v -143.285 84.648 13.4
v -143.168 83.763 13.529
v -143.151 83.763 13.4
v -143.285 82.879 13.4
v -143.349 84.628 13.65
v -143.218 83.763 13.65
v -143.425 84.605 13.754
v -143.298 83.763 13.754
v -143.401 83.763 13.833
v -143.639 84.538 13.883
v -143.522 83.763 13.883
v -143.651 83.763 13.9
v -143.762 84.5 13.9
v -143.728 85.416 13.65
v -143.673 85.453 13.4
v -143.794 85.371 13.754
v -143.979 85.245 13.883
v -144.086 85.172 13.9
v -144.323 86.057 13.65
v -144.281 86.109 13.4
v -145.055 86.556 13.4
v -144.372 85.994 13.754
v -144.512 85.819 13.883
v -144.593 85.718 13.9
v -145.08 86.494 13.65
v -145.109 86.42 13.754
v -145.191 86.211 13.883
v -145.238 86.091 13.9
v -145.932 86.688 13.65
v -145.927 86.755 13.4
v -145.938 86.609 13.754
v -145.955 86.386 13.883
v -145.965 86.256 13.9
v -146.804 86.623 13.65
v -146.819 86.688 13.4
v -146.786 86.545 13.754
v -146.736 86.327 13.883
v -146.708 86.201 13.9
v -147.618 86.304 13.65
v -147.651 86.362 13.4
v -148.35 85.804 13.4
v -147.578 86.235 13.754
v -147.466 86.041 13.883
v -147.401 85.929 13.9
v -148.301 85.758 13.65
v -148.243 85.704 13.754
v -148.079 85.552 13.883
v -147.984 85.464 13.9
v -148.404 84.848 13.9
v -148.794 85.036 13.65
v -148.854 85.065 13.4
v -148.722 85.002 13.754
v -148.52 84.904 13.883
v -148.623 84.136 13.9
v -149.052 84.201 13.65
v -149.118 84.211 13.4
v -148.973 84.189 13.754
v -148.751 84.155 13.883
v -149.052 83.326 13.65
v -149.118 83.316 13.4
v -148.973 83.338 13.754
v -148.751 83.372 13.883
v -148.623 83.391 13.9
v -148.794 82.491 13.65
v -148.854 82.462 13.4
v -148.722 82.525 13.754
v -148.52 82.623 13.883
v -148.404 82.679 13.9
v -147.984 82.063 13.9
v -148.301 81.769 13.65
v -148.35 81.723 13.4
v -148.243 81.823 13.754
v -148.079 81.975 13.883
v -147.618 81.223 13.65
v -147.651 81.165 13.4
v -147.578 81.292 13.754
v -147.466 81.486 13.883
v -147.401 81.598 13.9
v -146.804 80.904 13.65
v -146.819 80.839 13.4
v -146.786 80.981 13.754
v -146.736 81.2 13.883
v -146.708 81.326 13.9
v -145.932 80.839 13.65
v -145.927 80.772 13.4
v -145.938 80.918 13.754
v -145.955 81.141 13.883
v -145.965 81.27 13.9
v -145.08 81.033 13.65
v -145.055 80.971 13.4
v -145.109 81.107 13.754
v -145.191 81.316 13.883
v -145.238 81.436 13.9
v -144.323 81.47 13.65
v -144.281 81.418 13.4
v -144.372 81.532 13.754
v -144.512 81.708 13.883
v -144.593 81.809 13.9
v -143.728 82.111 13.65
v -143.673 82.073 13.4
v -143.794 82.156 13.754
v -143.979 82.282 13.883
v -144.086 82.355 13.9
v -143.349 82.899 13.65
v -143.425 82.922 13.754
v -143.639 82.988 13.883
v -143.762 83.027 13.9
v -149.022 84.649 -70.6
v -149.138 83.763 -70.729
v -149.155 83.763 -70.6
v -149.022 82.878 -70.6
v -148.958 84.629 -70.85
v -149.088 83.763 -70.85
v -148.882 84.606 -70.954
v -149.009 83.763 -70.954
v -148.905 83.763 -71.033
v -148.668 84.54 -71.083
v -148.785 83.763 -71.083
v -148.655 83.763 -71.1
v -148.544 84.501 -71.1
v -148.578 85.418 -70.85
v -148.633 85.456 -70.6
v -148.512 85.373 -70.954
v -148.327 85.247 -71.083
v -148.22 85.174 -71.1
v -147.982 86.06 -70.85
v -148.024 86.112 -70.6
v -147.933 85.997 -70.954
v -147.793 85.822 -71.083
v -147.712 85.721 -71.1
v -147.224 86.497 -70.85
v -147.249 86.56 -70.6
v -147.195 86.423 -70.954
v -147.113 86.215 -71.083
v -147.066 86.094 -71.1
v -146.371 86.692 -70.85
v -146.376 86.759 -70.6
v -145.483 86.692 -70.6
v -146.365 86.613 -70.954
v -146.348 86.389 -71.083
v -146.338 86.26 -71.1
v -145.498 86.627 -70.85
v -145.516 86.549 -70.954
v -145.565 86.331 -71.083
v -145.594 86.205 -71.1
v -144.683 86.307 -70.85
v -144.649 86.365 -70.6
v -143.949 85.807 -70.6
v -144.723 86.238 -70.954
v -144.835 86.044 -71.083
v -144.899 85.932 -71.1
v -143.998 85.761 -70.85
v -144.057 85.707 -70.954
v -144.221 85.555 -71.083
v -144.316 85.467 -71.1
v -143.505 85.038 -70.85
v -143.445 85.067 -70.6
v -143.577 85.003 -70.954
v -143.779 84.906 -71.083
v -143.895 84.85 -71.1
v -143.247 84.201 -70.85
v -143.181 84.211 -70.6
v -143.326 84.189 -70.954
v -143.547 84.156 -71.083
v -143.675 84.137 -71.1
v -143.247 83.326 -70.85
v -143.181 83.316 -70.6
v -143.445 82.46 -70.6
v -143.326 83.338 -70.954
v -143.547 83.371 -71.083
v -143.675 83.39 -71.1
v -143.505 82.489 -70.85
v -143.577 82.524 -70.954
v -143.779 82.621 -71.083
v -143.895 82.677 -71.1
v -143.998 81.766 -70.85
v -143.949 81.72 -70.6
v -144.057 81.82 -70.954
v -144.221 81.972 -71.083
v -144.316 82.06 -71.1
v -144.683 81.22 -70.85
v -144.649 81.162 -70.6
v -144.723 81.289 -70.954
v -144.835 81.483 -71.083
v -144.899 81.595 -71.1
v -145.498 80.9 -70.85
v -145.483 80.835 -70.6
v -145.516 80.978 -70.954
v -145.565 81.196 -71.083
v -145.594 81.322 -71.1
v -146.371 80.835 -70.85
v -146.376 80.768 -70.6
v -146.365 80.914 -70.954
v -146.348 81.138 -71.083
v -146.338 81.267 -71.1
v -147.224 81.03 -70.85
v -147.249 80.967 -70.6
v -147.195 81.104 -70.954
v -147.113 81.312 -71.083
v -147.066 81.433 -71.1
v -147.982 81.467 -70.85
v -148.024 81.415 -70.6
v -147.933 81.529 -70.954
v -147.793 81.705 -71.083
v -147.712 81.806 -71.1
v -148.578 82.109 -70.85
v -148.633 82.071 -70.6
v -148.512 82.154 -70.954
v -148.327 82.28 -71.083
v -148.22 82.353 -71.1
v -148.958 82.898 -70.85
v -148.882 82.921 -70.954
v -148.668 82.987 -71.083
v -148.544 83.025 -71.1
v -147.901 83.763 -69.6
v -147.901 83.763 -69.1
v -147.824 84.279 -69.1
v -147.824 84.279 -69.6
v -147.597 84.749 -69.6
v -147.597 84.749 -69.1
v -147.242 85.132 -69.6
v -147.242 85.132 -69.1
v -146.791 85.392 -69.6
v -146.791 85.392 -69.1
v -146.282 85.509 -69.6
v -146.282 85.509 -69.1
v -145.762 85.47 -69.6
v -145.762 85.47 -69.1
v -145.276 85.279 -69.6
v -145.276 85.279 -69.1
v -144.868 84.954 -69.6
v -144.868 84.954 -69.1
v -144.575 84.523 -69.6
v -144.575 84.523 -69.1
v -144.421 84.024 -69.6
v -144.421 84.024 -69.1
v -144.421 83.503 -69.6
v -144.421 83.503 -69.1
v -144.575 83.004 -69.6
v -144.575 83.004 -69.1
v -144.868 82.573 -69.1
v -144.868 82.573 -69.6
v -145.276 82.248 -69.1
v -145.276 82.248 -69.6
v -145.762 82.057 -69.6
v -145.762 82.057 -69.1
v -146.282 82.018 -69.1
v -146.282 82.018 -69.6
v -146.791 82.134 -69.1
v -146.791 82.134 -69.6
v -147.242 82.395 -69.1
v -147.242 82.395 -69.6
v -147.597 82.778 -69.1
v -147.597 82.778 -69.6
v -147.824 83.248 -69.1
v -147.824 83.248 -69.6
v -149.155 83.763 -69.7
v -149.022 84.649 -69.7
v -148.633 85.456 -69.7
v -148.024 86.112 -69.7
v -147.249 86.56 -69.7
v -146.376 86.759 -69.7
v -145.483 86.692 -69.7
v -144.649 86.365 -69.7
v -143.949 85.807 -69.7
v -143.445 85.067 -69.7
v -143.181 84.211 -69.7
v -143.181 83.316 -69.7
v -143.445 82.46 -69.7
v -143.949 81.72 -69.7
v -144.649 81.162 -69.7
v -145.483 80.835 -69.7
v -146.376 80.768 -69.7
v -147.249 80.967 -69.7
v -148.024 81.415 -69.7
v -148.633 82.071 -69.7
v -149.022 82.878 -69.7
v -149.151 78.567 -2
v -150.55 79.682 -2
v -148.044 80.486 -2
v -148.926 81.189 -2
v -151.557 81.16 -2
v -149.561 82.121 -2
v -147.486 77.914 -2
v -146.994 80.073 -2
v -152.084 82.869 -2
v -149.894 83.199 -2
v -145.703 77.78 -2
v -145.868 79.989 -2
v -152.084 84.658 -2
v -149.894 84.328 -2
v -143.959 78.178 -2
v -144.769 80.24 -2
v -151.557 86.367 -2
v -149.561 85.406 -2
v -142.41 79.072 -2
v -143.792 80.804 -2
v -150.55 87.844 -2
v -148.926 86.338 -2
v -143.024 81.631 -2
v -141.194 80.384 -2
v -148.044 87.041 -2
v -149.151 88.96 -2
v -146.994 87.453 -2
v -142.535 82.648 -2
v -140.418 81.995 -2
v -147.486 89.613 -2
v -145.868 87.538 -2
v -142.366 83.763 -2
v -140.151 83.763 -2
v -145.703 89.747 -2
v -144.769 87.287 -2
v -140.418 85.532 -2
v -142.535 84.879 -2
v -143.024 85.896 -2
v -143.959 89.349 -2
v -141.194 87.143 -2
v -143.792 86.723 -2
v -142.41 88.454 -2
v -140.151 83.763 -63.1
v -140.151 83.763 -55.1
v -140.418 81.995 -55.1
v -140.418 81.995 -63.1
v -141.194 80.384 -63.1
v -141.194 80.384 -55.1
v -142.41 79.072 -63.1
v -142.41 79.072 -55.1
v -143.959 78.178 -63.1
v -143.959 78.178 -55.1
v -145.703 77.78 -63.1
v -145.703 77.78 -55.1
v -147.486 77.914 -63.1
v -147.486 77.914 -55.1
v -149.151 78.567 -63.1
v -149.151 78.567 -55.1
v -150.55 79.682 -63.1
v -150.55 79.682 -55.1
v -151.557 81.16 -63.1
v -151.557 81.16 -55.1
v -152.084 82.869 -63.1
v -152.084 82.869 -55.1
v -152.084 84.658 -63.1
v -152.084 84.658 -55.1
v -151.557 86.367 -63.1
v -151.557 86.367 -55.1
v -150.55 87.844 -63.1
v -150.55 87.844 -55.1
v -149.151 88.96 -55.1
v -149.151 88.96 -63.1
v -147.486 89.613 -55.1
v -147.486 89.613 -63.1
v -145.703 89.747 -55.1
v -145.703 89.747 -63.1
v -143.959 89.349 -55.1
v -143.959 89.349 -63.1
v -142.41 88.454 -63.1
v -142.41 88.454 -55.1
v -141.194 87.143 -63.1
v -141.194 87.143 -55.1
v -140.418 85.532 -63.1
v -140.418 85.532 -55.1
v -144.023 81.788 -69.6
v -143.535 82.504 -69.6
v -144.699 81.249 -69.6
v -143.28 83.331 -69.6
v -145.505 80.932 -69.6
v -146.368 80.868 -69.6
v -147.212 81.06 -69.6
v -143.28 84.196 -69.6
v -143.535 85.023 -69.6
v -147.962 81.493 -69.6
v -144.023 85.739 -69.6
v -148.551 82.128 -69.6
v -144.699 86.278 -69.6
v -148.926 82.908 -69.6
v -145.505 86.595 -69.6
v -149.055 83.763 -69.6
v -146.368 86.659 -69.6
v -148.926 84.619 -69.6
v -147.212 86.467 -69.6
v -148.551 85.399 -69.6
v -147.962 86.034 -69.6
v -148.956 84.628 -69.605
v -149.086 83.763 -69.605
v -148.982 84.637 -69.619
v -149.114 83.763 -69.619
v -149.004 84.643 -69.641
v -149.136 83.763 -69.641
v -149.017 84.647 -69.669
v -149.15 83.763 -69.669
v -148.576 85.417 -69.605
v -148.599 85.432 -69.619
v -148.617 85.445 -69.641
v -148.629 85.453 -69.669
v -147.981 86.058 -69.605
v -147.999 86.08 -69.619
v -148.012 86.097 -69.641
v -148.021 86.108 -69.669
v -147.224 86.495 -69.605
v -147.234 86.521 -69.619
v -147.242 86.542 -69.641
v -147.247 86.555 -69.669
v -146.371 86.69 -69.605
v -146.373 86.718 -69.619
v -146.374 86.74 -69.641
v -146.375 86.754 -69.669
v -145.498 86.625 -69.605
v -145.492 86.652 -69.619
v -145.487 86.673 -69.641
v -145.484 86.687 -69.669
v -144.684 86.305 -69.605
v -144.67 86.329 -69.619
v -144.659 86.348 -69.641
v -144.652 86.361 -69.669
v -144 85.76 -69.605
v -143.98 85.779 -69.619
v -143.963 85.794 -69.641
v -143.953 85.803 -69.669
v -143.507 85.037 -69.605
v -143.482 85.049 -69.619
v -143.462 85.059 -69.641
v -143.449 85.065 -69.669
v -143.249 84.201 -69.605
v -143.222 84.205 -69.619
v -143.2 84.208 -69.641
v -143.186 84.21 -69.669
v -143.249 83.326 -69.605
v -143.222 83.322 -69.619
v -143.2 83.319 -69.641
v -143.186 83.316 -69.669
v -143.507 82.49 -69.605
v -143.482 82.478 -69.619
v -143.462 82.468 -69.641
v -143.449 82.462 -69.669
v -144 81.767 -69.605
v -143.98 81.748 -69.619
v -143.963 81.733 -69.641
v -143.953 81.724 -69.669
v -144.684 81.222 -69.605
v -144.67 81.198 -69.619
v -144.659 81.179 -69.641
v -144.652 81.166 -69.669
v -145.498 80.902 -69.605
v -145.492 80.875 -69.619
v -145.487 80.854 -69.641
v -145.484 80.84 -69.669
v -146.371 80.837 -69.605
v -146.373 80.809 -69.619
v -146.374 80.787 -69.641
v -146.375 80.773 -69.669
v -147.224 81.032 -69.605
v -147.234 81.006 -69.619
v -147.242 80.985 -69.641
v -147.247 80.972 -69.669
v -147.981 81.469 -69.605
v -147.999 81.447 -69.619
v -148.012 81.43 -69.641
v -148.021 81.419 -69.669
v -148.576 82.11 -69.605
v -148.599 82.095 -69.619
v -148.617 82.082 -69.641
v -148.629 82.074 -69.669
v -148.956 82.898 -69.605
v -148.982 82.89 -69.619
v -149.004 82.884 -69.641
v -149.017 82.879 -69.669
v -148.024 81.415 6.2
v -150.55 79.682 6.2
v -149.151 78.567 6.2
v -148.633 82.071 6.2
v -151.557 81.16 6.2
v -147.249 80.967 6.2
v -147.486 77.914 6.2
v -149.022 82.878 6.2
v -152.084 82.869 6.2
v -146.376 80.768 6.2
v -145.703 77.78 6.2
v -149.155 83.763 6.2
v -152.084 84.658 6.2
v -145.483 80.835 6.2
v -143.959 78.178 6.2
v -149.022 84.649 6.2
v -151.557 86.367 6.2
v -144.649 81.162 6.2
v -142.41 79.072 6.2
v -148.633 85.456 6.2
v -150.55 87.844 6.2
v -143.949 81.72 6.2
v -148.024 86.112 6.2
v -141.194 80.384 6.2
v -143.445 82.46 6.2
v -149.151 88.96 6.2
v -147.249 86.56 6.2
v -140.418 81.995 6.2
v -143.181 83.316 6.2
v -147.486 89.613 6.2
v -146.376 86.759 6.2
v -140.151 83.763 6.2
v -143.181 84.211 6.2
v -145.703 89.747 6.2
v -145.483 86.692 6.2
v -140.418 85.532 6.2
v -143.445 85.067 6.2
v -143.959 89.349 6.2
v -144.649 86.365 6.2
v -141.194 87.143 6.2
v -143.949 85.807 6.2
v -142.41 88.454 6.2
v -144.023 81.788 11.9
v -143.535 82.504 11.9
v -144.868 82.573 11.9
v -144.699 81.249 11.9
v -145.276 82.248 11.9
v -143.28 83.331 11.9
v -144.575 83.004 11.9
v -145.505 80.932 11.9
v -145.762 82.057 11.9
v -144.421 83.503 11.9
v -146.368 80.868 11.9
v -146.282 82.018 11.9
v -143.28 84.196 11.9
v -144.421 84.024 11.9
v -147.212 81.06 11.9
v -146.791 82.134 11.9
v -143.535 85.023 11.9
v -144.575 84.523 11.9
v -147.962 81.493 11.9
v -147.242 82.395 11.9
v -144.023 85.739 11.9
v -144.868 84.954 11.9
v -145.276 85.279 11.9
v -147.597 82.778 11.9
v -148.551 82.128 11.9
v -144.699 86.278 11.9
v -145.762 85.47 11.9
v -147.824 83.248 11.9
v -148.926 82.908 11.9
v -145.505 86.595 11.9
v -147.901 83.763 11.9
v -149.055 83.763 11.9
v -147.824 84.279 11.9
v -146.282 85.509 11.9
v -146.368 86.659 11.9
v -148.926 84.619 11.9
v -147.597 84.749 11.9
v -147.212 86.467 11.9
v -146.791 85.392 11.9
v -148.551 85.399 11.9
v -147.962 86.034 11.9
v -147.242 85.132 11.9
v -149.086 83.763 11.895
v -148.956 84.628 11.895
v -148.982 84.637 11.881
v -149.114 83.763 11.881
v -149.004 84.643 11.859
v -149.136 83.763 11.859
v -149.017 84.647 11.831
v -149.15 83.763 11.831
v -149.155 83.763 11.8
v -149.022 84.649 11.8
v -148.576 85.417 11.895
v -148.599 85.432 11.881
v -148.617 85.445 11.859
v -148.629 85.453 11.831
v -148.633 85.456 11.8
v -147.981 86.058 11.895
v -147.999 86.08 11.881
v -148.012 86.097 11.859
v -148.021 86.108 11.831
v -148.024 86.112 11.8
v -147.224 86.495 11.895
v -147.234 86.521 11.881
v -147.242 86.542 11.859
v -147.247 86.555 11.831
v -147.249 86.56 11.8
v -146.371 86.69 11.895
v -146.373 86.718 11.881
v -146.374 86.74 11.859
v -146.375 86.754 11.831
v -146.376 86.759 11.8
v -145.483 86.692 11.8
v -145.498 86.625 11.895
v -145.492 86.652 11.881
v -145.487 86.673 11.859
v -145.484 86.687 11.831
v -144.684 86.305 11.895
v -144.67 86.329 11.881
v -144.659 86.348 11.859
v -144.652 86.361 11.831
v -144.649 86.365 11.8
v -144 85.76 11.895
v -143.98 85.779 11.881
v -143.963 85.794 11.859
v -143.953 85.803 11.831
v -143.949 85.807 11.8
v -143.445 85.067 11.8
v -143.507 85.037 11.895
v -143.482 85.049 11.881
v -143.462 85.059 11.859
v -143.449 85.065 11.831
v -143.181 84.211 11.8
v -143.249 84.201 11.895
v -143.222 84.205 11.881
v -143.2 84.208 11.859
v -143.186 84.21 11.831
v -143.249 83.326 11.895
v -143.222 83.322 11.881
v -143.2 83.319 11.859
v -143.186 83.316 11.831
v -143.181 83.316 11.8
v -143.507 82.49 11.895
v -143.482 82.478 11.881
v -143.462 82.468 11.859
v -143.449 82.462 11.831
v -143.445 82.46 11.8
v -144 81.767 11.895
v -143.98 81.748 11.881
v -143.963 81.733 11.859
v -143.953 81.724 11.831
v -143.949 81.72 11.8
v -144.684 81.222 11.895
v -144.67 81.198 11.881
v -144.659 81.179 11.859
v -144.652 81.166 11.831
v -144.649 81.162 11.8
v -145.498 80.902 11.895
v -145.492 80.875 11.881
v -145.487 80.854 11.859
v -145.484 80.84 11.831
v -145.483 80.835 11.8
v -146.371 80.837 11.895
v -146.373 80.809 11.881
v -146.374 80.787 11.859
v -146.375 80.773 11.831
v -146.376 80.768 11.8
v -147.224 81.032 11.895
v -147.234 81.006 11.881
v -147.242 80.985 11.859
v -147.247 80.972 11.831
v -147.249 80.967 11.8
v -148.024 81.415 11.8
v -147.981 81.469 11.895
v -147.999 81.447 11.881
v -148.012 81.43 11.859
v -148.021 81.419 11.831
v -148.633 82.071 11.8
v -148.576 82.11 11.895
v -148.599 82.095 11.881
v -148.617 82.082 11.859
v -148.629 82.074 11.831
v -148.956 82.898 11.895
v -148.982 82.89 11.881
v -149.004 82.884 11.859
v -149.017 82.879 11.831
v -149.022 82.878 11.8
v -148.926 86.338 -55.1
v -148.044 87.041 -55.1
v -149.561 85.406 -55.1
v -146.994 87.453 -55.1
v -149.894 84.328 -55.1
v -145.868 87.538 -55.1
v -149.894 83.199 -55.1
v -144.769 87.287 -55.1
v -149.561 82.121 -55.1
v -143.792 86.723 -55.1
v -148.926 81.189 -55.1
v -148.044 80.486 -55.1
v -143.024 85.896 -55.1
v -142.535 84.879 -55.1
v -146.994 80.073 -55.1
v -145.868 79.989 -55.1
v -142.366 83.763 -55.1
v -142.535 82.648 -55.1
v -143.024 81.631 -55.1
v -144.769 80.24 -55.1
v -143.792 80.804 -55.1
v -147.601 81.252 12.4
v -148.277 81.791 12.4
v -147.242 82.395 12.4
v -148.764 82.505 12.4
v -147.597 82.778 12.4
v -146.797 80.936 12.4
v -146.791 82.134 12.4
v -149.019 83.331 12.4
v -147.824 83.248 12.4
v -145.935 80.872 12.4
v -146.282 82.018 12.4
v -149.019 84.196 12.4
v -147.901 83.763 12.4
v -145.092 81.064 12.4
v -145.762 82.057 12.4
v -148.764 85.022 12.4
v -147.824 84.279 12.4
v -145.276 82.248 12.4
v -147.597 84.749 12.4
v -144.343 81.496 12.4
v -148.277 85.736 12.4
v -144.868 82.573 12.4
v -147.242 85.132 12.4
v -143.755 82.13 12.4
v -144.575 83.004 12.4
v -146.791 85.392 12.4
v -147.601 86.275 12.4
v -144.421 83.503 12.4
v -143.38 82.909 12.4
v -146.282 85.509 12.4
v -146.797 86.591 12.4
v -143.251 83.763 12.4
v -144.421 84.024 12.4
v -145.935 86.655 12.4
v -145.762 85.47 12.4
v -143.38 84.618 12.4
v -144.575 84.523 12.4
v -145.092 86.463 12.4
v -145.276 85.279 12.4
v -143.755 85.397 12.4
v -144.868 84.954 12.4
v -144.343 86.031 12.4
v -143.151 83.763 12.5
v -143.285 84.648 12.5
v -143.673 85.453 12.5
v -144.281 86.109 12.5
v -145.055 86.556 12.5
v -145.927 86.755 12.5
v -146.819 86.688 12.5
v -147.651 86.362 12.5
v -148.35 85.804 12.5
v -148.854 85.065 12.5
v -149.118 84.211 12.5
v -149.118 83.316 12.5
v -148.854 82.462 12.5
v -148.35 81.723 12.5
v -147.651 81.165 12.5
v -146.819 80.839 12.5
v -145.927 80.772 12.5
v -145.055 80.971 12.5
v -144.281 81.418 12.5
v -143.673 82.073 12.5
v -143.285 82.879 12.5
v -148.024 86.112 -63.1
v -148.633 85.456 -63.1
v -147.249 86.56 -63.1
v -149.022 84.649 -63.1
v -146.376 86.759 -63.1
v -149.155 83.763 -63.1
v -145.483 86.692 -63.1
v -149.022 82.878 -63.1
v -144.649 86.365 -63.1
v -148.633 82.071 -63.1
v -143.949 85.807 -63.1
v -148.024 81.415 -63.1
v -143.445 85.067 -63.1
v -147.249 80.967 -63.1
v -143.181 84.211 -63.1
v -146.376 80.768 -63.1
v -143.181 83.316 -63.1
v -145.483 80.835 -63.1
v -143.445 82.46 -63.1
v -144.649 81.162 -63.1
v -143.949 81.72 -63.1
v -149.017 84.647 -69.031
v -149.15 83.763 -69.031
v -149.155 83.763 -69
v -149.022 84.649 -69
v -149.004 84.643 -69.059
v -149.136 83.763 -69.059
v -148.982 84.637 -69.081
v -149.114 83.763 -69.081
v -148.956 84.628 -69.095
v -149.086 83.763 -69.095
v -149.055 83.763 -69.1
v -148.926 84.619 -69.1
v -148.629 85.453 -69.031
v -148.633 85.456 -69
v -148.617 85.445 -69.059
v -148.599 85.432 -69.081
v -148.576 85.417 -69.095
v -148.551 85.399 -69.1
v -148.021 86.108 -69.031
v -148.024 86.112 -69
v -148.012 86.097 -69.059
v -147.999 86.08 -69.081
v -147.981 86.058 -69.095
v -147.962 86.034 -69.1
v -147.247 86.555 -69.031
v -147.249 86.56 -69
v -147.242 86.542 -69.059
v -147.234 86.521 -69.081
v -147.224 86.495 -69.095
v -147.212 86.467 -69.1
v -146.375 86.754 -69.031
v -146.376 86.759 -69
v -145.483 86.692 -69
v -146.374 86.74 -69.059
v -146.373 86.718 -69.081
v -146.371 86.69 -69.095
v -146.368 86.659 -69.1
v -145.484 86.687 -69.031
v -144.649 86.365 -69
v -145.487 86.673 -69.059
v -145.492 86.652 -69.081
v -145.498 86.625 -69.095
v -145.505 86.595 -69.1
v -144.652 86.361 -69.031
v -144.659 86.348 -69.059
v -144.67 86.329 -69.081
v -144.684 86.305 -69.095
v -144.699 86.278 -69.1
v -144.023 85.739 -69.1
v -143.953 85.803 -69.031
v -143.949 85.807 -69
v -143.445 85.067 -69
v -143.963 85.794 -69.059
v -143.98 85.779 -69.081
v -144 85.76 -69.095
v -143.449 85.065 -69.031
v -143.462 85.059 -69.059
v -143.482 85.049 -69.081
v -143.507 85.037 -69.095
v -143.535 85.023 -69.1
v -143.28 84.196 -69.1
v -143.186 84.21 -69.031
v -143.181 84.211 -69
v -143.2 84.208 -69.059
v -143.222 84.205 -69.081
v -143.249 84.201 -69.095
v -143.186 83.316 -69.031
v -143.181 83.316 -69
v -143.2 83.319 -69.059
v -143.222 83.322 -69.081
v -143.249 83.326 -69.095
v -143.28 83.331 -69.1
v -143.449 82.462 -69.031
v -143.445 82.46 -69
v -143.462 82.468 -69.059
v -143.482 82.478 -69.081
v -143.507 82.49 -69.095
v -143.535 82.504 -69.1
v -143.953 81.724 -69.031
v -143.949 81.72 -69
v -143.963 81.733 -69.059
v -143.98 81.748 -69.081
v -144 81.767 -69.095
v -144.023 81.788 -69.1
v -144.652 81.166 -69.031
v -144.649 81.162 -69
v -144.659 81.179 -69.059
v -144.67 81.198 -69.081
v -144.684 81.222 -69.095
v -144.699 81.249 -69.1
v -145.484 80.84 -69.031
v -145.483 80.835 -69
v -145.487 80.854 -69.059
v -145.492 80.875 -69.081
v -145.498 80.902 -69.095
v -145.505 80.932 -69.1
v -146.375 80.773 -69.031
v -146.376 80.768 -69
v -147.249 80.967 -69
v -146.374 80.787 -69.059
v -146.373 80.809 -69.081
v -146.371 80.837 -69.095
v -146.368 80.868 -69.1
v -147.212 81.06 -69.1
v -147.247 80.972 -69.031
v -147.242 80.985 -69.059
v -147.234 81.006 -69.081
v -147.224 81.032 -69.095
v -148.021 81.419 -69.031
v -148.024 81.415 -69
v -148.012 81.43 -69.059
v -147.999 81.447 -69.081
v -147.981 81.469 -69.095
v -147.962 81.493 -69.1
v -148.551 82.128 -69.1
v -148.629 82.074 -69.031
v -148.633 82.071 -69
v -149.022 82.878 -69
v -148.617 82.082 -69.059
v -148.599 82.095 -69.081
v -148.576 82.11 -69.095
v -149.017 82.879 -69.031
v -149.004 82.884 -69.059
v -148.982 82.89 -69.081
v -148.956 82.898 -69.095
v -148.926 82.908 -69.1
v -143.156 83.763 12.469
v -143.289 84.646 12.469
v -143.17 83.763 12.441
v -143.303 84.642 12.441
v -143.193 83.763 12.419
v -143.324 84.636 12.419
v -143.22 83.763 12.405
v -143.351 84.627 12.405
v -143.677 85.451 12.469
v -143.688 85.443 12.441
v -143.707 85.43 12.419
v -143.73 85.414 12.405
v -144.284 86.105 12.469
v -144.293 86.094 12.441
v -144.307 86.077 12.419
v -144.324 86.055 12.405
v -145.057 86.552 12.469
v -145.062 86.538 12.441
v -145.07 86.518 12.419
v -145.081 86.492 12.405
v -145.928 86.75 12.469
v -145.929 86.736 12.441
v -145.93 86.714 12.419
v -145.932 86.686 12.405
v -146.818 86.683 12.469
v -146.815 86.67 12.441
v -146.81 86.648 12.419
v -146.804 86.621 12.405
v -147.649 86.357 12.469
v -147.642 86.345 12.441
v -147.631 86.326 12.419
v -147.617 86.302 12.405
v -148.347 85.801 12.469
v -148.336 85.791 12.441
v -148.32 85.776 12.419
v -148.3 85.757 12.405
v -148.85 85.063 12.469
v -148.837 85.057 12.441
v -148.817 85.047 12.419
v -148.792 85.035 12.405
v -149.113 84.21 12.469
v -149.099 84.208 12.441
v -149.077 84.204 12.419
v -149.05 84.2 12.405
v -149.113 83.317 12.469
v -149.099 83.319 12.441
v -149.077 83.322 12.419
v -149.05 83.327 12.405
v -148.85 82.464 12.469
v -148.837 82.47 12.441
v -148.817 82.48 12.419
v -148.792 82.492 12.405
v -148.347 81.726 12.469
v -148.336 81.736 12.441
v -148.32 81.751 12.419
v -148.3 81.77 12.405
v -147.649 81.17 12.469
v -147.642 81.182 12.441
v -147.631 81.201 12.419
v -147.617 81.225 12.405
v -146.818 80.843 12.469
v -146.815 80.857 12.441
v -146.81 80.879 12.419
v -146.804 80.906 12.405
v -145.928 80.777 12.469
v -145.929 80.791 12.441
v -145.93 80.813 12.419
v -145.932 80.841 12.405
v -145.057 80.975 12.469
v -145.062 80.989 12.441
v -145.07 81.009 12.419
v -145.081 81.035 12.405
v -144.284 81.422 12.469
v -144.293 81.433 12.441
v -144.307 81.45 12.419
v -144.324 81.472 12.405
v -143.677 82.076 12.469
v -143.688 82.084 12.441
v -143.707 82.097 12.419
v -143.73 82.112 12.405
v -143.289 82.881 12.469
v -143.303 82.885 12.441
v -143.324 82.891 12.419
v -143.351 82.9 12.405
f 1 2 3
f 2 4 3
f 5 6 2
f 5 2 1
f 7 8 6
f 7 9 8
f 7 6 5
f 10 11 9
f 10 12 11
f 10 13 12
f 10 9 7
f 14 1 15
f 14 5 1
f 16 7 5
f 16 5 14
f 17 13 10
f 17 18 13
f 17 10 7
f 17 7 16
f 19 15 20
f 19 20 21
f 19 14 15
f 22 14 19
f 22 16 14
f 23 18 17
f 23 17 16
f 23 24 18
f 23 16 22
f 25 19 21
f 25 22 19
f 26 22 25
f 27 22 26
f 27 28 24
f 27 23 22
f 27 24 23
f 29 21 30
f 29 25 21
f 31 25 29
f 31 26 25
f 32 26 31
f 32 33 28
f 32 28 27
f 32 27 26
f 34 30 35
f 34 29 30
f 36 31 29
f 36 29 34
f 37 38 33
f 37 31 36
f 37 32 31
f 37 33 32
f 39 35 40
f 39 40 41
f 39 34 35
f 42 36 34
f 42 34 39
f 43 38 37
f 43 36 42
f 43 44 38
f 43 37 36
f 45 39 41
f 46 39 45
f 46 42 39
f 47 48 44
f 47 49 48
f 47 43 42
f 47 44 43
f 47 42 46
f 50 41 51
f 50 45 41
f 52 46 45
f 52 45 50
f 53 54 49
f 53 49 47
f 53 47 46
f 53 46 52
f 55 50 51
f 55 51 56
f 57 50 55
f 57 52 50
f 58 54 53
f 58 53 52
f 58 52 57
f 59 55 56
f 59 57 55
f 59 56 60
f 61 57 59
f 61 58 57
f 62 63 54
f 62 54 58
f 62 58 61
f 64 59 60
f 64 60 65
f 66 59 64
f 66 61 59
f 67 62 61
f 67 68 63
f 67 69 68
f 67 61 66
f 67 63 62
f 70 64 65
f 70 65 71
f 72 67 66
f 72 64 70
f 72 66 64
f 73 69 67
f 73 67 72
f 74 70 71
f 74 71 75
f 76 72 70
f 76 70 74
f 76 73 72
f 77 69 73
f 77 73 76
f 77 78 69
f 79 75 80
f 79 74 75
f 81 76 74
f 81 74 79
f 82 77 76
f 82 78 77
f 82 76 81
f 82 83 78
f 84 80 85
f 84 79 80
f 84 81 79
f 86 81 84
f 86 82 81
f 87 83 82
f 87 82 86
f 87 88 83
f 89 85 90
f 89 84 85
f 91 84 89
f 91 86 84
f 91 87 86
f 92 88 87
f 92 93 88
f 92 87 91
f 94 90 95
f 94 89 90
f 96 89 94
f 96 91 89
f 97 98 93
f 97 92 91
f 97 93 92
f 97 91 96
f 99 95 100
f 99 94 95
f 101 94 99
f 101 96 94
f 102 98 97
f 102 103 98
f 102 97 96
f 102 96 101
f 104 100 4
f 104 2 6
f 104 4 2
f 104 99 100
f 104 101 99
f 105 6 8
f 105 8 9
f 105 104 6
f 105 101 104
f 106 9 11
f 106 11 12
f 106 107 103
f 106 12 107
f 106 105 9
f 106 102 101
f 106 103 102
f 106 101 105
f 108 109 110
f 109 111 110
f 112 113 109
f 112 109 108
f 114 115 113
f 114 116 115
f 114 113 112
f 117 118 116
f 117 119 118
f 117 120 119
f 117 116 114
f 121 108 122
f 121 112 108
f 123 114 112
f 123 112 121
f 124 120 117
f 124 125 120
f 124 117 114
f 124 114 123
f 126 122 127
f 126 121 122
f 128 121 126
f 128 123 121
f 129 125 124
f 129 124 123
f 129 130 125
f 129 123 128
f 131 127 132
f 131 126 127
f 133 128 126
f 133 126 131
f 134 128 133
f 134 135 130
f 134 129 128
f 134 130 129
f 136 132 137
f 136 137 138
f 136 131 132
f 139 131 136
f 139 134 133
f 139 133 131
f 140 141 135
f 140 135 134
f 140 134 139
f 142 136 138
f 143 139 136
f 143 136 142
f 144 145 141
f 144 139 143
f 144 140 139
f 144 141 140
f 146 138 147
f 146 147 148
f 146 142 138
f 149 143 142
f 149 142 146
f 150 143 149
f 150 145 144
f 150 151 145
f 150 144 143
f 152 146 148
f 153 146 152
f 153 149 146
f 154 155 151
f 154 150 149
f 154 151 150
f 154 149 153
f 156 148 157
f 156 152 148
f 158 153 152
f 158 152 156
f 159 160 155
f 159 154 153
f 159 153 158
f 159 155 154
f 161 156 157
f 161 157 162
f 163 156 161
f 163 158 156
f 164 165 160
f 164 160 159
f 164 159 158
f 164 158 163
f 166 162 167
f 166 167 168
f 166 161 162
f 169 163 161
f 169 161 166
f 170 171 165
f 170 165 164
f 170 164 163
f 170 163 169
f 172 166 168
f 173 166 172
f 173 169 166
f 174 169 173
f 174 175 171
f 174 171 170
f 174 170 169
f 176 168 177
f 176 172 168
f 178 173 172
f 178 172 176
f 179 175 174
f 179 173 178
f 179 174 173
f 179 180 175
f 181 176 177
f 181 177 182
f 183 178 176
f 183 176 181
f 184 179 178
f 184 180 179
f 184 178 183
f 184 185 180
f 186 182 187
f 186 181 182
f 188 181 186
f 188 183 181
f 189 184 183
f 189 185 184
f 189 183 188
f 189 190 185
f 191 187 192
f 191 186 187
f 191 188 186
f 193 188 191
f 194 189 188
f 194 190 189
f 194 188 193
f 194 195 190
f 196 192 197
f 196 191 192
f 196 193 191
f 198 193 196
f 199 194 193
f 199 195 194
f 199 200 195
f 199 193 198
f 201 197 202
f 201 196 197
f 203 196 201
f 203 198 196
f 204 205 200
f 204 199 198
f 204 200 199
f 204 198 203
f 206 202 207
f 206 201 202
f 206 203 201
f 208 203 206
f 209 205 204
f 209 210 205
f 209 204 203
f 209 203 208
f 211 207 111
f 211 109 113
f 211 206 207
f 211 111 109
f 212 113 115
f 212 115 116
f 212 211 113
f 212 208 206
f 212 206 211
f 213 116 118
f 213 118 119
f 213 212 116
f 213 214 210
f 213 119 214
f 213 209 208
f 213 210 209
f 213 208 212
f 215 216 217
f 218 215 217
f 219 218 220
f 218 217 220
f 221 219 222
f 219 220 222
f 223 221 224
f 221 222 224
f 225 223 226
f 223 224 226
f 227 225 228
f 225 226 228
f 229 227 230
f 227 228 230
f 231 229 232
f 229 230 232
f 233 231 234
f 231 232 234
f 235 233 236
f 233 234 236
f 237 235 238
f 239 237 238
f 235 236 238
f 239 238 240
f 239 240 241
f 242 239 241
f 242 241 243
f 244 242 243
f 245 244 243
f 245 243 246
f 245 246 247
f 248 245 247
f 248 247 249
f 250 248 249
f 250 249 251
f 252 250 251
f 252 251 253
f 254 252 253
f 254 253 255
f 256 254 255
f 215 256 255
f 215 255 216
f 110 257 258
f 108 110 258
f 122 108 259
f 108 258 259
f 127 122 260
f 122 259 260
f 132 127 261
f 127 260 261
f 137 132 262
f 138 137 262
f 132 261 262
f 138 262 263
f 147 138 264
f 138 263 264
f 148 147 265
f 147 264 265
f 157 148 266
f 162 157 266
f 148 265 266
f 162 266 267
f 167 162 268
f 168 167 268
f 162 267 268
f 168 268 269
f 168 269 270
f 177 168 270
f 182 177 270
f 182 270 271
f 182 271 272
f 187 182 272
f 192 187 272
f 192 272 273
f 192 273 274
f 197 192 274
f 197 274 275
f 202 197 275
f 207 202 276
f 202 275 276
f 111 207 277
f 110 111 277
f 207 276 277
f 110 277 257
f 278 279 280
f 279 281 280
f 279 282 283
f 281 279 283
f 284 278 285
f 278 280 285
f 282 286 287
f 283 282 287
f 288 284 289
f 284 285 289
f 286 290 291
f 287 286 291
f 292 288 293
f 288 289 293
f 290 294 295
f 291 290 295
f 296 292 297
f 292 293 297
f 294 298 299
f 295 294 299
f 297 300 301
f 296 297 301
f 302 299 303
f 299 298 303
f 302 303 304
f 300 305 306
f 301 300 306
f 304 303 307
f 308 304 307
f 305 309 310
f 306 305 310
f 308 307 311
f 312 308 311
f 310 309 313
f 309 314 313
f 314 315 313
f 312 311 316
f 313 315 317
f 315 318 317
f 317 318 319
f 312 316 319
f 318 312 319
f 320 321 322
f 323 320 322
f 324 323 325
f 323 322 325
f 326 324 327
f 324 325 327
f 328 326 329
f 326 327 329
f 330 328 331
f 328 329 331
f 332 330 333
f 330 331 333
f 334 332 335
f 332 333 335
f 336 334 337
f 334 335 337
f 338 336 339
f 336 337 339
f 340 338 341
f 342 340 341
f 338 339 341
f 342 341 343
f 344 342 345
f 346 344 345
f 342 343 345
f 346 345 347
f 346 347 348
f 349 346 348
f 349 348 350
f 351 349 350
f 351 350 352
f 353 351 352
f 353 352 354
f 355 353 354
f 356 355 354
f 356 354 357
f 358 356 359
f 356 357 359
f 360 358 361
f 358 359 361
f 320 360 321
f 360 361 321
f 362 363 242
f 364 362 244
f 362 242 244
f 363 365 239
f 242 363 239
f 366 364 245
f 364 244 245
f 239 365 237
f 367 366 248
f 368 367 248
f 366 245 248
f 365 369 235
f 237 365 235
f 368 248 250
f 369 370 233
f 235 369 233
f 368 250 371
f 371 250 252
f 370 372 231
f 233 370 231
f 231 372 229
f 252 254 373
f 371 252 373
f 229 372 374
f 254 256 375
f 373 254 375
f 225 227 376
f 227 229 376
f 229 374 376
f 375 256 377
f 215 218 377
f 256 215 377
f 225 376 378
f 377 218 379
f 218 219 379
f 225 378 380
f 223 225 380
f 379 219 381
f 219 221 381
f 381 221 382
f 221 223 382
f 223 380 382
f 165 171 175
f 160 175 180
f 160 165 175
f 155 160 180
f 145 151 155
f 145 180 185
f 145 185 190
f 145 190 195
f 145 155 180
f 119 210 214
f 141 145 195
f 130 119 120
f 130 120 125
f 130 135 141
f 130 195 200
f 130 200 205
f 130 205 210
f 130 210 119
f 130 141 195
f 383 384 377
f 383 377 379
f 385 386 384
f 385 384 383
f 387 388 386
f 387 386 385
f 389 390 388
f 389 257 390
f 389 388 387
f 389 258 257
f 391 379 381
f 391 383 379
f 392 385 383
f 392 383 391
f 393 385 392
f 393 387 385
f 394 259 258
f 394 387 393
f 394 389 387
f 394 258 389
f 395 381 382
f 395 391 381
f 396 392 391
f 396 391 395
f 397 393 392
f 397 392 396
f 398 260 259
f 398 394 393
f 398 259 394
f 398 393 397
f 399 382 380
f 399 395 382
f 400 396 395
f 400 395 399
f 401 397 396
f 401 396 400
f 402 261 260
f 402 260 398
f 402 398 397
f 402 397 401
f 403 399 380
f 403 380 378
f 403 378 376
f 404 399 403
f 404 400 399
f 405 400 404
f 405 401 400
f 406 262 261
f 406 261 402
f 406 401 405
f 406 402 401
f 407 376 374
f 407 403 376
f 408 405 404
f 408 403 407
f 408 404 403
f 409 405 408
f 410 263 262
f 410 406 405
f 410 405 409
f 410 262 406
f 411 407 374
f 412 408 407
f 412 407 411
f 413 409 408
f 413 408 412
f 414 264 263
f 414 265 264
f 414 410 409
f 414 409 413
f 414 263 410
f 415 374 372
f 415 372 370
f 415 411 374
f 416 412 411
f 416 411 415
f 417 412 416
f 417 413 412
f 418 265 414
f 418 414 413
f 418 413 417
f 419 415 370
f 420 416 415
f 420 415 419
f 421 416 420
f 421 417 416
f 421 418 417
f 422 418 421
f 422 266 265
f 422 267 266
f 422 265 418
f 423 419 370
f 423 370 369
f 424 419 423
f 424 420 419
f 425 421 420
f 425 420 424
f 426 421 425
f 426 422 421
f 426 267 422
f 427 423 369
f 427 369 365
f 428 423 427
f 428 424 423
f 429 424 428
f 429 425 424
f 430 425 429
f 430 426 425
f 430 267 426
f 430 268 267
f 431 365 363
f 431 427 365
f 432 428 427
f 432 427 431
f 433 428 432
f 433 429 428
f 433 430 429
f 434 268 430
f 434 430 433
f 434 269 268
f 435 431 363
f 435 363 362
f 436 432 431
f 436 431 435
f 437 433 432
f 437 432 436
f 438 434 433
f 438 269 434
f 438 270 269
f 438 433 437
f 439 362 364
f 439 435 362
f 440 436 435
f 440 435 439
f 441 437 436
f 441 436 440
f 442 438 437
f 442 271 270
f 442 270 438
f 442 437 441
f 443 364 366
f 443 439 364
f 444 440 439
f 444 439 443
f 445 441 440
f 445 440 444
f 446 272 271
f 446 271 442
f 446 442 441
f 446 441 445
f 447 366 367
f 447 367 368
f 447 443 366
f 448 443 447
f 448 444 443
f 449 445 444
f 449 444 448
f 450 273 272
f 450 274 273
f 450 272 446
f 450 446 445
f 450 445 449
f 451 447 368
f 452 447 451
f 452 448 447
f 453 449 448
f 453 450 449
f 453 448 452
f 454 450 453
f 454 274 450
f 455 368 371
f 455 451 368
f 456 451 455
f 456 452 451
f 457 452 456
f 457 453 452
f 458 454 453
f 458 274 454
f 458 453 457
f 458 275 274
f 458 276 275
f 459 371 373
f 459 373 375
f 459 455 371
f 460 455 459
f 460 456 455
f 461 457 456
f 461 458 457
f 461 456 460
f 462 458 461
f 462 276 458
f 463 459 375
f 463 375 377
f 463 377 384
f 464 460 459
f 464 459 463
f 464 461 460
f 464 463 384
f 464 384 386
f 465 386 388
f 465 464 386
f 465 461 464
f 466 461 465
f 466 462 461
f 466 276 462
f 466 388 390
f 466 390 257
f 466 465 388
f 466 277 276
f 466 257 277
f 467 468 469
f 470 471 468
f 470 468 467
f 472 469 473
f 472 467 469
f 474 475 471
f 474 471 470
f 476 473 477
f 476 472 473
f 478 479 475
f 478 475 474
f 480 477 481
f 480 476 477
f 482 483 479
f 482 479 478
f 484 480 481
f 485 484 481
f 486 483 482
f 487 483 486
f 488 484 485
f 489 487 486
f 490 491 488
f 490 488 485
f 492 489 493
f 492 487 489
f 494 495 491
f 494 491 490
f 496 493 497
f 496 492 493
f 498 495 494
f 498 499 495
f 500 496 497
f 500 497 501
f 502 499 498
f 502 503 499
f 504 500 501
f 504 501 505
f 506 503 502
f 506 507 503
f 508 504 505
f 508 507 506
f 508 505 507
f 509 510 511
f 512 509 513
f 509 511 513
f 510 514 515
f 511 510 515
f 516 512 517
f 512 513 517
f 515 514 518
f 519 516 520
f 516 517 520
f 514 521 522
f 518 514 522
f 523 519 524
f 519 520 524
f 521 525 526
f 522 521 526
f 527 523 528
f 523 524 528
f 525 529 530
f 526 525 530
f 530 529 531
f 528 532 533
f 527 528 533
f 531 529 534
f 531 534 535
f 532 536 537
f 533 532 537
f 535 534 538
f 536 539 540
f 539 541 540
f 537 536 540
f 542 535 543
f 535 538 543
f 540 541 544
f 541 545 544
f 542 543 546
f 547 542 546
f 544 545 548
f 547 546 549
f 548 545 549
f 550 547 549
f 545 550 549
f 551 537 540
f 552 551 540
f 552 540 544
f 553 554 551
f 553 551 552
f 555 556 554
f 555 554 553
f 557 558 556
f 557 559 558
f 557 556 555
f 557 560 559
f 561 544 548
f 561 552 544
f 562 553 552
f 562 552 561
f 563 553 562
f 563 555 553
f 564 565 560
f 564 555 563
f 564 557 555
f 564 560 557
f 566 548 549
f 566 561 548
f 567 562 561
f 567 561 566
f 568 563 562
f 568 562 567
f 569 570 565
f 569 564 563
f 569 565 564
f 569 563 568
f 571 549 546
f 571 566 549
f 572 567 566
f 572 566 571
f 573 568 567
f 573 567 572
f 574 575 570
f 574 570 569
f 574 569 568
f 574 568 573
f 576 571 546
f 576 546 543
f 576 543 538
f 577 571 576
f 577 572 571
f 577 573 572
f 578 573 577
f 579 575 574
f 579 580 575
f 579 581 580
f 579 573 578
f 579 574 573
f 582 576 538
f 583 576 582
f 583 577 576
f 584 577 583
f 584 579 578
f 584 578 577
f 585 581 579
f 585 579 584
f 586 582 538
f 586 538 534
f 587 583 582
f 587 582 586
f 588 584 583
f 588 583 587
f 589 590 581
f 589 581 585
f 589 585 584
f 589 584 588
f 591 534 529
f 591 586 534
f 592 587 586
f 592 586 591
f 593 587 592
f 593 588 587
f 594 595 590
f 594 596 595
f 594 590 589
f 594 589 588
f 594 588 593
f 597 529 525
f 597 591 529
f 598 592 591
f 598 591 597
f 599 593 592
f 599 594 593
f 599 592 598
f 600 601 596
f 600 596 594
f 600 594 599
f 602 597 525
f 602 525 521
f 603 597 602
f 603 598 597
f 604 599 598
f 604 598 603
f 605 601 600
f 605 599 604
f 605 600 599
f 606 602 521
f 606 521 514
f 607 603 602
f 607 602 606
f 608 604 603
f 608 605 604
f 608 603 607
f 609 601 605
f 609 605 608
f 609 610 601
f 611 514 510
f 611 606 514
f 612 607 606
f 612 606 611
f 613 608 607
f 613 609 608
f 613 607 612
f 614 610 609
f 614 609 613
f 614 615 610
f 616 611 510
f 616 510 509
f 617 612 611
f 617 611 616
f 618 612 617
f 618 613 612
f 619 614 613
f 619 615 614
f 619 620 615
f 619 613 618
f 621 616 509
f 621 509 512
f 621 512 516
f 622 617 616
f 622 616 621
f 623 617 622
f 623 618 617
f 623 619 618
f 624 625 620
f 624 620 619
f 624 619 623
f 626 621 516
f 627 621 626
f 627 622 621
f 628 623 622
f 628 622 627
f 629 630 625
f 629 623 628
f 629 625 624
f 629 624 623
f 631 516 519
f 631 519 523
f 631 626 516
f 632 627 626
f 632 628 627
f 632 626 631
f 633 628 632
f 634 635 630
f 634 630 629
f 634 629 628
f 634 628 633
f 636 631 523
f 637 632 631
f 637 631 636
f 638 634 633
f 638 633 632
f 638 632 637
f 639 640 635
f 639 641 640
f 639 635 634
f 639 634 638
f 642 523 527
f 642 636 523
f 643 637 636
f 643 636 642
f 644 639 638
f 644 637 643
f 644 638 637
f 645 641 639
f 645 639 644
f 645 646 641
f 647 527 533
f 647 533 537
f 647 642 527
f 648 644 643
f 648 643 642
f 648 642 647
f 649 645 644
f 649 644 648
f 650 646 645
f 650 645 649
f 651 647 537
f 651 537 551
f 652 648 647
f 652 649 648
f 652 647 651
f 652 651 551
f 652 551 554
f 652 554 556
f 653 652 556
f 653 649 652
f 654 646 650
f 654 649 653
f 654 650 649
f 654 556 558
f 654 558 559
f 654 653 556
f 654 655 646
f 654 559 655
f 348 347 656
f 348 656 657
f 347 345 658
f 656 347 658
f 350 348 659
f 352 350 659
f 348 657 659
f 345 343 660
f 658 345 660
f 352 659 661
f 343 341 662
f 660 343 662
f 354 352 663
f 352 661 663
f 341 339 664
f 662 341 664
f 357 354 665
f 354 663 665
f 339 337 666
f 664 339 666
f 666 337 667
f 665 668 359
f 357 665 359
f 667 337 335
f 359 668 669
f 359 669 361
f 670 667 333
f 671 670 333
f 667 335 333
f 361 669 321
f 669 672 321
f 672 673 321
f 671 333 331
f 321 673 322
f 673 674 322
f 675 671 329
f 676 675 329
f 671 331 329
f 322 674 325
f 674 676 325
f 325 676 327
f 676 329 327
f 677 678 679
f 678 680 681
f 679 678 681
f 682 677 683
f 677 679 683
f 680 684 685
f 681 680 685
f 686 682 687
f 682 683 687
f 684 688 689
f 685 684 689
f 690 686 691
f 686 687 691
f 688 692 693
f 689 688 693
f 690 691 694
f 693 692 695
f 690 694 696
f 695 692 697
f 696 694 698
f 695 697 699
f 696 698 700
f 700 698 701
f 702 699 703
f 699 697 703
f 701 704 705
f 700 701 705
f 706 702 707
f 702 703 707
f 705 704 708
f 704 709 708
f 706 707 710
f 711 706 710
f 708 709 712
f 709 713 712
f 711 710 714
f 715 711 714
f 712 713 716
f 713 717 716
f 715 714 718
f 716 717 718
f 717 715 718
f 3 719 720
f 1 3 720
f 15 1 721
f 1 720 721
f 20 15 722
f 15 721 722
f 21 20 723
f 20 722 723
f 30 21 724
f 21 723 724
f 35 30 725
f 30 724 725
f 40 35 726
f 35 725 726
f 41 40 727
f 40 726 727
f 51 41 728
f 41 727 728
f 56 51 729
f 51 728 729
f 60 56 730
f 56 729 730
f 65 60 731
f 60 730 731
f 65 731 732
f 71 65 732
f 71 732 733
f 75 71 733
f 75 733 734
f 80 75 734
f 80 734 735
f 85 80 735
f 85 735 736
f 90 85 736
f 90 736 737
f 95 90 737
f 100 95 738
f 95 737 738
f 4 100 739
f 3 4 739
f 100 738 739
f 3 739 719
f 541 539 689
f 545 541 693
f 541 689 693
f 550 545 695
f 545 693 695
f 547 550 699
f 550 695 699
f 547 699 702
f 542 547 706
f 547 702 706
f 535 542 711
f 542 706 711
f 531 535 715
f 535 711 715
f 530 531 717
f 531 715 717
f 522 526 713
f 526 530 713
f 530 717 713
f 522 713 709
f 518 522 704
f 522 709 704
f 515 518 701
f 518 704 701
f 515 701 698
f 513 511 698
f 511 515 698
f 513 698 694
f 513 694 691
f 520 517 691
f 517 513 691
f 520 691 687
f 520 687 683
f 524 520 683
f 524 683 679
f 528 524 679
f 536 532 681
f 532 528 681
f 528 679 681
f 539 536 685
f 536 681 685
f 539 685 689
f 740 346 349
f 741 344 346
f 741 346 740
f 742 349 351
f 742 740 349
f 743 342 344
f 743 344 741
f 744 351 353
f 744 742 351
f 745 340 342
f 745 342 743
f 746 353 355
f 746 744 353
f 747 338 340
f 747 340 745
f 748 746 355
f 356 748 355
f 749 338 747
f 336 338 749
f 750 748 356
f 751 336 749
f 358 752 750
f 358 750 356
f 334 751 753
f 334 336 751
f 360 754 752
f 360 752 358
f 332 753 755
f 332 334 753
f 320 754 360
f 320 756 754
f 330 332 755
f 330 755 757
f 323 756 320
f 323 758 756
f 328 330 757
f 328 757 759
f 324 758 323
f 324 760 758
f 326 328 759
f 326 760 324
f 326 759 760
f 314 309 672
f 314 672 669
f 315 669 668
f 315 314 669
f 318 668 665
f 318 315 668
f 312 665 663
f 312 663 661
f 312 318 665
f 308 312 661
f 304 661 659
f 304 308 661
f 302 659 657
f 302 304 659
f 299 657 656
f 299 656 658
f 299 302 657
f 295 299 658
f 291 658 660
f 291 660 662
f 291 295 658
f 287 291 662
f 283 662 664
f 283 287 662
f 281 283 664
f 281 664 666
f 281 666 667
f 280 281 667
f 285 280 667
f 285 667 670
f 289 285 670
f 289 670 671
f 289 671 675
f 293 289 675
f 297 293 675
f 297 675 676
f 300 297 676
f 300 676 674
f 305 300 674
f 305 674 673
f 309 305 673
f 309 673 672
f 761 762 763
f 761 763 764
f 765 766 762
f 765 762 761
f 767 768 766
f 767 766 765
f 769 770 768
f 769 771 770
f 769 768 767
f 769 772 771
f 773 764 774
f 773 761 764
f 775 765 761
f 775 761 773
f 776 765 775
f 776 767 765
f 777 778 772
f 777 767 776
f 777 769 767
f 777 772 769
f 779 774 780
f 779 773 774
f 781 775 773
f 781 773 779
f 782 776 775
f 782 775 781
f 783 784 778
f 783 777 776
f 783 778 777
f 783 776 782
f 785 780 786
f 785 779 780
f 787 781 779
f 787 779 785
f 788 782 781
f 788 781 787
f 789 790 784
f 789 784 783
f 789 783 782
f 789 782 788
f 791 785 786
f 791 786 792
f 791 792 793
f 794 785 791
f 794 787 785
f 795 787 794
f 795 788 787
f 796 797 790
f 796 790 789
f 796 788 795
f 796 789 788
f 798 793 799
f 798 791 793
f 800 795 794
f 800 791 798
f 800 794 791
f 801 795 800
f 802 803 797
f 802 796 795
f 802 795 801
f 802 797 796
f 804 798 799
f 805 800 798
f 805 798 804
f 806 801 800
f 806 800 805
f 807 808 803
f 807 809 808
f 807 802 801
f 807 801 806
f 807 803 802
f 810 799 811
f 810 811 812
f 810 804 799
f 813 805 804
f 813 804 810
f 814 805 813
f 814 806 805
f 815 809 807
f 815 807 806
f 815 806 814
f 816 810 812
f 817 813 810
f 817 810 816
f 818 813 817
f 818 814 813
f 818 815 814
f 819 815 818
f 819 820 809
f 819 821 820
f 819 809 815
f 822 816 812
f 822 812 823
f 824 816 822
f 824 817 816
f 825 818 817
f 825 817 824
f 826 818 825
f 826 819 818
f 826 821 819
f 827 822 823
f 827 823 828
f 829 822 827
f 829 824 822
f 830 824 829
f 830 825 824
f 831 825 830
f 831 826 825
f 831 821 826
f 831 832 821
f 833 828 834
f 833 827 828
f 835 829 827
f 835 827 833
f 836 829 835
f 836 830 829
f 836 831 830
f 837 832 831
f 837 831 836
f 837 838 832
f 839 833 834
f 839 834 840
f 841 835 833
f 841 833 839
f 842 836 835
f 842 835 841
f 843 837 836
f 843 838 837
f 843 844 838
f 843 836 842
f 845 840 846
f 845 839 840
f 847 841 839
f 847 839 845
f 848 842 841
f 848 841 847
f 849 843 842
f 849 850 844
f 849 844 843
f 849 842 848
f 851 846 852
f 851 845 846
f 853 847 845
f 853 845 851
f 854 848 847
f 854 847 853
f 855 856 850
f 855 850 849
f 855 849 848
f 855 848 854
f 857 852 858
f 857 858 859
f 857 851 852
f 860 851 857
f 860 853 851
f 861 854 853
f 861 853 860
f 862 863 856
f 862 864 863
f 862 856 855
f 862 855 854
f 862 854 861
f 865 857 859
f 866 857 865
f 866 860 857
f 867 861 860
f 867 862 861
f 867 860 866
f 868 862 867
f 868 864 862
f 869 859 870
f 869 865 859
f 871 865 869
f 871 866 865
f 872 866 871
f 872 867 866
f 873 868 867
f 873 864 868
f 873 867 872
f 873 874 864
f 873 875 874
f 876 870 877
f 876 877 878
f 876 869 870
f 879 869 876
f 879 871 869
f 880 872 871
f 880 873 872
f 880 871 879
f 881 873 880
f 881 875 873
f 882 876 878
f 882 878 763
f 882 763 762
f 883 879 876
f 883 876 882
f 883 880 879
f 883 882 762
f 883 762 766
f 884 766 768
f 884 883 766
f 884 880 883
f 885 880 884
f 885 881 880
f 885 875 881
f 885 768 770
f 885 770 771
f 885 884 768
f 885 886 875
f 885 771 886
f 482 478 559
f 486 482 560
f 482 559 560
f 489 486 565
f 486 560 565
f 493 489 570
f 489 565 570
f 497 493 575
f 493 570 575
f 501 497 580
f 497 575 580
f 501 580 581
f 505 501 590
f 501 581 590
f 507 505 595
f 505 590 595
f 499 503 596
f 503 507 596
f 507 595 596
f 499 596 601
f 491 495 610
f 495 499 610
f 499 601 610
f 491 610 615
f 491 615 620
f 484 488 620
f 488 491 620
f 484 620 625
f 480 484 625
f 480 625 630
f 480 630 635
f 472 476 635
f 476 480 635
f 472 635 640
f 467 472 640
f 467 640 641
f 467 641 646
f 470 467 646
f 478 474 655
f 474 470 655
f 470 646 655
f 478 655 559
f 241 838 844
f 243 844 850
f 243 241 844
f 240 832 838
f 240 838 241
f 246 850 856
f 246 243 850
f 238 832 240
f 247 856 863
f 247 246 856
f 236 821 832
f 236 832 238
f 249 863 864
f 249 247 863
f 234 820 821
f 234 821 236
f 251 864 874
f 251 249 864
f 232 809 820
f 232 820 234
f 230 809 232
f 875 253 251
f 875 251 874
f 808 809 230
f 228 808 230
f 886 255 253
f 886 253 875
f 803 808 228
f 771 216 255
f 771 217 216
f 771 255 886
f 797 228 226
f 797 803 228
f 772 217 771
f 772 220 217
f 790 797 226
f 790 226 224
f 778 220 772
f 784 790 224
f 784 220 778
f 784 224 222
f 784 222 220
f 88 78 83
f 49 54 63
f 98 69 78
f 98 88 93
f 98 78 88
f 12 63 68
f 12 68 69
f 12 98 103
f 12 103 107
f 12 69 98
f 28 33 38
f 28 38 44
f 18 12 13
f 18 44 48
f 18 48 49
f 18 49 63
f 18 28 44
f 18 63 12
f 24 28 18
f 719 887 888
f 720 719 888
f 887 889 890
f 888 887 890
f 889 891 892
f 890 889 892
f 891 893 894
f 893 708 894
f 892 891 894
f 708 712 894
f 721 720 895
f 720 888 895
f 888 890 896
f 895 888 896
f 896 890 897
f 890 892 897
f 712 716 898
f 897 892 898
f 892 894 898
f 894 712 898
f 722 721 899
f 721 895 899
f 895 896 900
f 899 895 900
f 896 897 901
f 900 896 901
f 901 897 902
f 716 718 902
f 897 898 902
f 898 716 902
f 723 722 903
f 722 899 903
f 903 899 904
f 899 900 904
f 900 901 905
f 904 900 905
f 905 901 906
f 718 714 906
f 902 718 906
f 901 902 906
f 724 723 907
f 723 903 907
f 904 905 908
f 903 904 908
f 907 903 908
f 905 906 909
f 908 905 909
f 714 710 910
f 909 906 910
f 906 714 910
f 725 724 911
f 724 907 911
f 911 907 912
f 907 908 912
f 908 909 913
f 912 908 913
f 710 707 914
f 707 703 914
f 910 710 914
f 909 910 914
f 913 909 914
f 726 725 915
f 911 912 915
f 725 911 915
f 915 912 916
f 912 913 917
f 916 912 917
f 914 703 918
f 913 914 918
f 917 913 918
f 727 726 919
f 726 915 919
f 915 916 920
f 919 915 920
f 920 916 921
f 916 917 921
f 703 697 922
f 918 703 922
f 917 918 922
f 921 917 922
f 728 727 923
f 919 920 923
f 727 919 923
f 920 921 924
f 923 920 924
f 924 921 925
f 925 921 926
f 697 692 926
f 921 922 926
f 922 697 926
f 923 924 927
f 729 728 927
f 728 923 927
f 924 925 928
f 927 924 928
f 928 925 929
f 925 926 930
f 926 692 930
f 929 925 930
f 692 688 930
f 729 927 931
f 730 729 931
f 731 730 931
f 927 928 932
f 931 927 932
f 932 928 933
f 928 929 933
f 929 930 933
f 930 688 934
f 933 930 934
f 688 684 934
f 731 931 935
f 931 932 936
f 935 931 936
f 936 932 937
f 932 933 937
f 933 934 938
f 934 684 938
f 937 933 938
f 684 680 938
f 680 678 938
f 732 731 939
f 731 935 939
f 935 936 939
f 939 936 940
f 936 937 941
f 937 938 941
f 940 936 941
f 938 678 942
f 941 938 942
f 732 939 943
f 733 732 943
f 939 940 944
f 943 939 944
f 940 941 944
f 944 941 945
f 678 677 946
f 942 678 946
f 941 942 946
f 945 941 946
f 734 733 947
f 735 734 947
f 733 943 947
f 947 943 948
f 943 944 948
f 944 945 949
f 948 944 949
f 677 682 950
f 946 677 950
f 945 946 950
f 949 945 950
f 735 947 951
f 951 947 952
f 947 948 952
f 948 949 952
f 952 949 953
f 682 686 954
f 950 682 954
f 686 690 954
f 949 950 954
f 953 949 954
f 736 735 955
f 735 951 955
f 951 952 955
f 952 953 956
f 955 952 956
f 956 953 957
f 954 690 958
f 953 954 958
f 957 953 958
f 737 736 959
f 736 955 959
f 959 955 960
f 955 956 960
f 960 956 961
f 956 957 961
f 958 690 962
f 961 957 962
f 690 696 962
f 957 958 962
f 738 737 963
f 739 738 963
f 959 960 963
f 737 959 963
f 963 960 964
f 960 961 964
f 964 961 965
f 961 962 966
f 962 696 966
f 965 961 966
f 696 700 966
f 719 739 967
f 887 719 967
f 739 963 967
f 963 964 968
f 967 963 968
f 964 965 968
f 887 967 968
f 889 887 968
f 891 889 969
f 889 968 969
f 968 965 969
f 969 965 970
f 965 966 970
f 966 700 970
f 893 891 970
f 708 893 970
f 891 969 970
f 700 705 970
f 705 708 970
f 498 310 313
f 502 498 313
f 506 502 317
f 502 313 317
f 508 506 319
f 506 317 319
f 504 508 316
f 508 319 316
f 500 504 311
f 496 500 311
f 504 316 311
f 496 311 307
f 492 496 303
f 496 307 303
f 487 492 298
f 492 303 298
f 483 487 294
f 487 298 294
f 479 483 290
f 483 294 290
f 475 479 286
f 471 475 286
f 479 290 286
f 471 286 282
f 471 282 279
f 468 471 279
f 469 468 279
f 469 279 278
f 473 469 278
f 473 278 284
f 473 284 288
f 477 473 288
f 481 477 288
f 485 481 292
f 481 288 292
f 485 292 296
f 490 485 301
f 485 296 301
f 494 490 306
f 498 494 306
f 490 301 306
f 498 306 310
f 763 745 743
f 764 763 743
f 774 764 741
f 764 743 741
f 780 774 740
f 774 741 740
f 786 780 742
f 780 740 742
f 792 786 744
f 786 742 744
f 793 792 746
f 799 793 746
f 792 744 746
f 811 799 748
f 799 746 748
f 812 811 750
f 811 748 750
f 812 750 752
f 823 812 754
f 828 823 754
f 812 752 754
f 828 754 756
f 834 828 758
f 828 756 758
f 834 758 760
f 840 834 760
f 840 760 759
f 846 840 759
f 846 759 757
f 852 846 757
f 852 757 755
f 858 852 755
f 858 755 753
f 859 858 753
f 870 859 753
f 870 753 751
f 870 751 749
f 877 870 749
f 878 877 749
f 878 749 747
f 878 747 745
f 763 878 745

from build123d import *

# Parameters (mm, degrees)
SKETCH1_R                = 3.784872219
BOSS_EXTRUDE1_DEPTH      = 55.1
BOSS_EXTRUDE2_DEPTH      = 6.2
BOSS_EXTRUDE2_DEPTH_BACK = 2
SKETCH2_R                = 6
SKETCH3_R                = 6
BOSS_EXTRUDE3_DEPTH      = 8
BOSS_EXTRUDE4_DEPTH      = 6
BOSS_EXTRUDE4_DEPTH_BACK = 75
SKETCH4_R                = 3.003880852
BOSS_EXTRUDE5_DEPTH      = 0.5
BOSS_EXTRUDE5_DEPTH_BACK = 81.5
SKETCH5_R                = 1.75
SKETCH6_R                = 3.003880852
BOSS_EXTRUDE6_DEPTH      = 1.5
SKETCH7_R                = 3
BOSS_EXTRUDE7_DEPTH      = 1.5
FILLET1_R                = 0.5
FILLET2_R                = 0.1


with BuildPart() as part:
    # Sketch1 → Boss-Extrude1 (new body)
    with BuildSketch(Plane.XY):
        with Locations((-146.151339286, 83.763457126)):
            Circle(SKETCH1_R)
    extrude(amount=-BOSS_EXTRUDE1_DEPTH)

    # Sketch2 → Boss-Extrude2 (add, two sides: drawn at the far end of the back side and taken through both)
    with BuildSketch(Plane.XY.offset(-BOSS_EXTRUDE2_DEPTH_BACK)):
        with Locations((-146.151339286, 83.763457126)):
            Circle(SKETCH2_R)
    extrude(amount=BOSS_EXTRUDE2_DEPTH + BOSS_EXTRUDE2_DEPTH_BACK)

    # Sketch3 → Boss-Extrude3 (add)
    with BuildSketch(Plane(origin=(0, 0, -55.1), x_dir=(-1, 0, 0), z_dir=(0, 0, -1))):
        with Locations(Location((146.151339286, 83.763457126, 0), (0, 0, 180))):
            Circle(SKETCH3_R)
    extrude(amount=BOSS_EXTRUDE3_DEPTH)

    # Sketch4 → Boss-Extrude4 (add, two sides: drawn at the far end of the back side and taken through both)
    with BuildSketch(Plane(origin=(0, 0, -63.1), x_dir=(-1, 0, 0), z_dir=(0, 0, -1)).offset(-BOSS_EXTRUDE4_DEPTH_BACK)):
        with Locations((146.151339286, 83.763457126)):
            Circle(SKETCH4_R)
    extrude(amount=BOSS_EXTRUDE4_DEPTH + BOSS_EXTRUDE4_DEPTH_BACK)

    # Sketch5 → Boss-Extrude5 (add, two sides: drawn at the far end of the back side and taken through both)
    with BuildSketch(Plane(origin=(0, 0, -69.1), x_dir=(-1, 0, 0), z_dir=(0, 0, -1)).offset(-BOSS_EXTRUDE5_DEPTH_BACK)):
        with Locations((146.151339286, 83.763457126)):
            Circle(SKETCH5_R)
    extrude(amount=BOSS_EXTRUDE5_DEPTH + BOSS_EXTRUDE5_DEPTH_BACK)

    # Sketch6 → Boss-Extrude6 (add)
    with BuildSketch(Plane(origin=(0, 0, -69.6), x_dir=(-1, 0, 0), z_dir=(0, 0, -1))):
        with Locations((146.151339286, 83.763457126)):
            Circle(SKETCH6_R)
    extrude(amount=BOSS_EXTRUDE6_DEPTH)

    # Sketch7 → Boss-Extrude7 (add)
    with BuildSketch(Plane.XY.offset(12.4)):
        with Locations((-146.151339286, 83.763457126)):
            Circle(SKETCH7_R)
    extrude(amount=BOSS_EXTRUDE7_DEPTH)

    # Fillet1
    fillet1_edges = [part.edges().sort_by_distance(p)[0] for p in [
        (-143.147458434, 83.763457126, -71.1),
        (-149.151339286, 83.763457126, 13.9),
    ]]
    fillet(fillet1_edges, radius=FILLET1_R)

    # Fillet2
    fillet2_edges = [part.edges().sort_by_distance(p)[0] for p in [
        (-143.147458434, 83.763457126, 11.9),
        (-143.147458434, 83.763457126, -69.1),
        (-143.147458434, 83.763457126, -69.6),
        (-149.151339286, 83.763457126, 12.4),
    ]]
    fillet(fillet2_edges, radius=FILLET2_R)


solid = part.part
